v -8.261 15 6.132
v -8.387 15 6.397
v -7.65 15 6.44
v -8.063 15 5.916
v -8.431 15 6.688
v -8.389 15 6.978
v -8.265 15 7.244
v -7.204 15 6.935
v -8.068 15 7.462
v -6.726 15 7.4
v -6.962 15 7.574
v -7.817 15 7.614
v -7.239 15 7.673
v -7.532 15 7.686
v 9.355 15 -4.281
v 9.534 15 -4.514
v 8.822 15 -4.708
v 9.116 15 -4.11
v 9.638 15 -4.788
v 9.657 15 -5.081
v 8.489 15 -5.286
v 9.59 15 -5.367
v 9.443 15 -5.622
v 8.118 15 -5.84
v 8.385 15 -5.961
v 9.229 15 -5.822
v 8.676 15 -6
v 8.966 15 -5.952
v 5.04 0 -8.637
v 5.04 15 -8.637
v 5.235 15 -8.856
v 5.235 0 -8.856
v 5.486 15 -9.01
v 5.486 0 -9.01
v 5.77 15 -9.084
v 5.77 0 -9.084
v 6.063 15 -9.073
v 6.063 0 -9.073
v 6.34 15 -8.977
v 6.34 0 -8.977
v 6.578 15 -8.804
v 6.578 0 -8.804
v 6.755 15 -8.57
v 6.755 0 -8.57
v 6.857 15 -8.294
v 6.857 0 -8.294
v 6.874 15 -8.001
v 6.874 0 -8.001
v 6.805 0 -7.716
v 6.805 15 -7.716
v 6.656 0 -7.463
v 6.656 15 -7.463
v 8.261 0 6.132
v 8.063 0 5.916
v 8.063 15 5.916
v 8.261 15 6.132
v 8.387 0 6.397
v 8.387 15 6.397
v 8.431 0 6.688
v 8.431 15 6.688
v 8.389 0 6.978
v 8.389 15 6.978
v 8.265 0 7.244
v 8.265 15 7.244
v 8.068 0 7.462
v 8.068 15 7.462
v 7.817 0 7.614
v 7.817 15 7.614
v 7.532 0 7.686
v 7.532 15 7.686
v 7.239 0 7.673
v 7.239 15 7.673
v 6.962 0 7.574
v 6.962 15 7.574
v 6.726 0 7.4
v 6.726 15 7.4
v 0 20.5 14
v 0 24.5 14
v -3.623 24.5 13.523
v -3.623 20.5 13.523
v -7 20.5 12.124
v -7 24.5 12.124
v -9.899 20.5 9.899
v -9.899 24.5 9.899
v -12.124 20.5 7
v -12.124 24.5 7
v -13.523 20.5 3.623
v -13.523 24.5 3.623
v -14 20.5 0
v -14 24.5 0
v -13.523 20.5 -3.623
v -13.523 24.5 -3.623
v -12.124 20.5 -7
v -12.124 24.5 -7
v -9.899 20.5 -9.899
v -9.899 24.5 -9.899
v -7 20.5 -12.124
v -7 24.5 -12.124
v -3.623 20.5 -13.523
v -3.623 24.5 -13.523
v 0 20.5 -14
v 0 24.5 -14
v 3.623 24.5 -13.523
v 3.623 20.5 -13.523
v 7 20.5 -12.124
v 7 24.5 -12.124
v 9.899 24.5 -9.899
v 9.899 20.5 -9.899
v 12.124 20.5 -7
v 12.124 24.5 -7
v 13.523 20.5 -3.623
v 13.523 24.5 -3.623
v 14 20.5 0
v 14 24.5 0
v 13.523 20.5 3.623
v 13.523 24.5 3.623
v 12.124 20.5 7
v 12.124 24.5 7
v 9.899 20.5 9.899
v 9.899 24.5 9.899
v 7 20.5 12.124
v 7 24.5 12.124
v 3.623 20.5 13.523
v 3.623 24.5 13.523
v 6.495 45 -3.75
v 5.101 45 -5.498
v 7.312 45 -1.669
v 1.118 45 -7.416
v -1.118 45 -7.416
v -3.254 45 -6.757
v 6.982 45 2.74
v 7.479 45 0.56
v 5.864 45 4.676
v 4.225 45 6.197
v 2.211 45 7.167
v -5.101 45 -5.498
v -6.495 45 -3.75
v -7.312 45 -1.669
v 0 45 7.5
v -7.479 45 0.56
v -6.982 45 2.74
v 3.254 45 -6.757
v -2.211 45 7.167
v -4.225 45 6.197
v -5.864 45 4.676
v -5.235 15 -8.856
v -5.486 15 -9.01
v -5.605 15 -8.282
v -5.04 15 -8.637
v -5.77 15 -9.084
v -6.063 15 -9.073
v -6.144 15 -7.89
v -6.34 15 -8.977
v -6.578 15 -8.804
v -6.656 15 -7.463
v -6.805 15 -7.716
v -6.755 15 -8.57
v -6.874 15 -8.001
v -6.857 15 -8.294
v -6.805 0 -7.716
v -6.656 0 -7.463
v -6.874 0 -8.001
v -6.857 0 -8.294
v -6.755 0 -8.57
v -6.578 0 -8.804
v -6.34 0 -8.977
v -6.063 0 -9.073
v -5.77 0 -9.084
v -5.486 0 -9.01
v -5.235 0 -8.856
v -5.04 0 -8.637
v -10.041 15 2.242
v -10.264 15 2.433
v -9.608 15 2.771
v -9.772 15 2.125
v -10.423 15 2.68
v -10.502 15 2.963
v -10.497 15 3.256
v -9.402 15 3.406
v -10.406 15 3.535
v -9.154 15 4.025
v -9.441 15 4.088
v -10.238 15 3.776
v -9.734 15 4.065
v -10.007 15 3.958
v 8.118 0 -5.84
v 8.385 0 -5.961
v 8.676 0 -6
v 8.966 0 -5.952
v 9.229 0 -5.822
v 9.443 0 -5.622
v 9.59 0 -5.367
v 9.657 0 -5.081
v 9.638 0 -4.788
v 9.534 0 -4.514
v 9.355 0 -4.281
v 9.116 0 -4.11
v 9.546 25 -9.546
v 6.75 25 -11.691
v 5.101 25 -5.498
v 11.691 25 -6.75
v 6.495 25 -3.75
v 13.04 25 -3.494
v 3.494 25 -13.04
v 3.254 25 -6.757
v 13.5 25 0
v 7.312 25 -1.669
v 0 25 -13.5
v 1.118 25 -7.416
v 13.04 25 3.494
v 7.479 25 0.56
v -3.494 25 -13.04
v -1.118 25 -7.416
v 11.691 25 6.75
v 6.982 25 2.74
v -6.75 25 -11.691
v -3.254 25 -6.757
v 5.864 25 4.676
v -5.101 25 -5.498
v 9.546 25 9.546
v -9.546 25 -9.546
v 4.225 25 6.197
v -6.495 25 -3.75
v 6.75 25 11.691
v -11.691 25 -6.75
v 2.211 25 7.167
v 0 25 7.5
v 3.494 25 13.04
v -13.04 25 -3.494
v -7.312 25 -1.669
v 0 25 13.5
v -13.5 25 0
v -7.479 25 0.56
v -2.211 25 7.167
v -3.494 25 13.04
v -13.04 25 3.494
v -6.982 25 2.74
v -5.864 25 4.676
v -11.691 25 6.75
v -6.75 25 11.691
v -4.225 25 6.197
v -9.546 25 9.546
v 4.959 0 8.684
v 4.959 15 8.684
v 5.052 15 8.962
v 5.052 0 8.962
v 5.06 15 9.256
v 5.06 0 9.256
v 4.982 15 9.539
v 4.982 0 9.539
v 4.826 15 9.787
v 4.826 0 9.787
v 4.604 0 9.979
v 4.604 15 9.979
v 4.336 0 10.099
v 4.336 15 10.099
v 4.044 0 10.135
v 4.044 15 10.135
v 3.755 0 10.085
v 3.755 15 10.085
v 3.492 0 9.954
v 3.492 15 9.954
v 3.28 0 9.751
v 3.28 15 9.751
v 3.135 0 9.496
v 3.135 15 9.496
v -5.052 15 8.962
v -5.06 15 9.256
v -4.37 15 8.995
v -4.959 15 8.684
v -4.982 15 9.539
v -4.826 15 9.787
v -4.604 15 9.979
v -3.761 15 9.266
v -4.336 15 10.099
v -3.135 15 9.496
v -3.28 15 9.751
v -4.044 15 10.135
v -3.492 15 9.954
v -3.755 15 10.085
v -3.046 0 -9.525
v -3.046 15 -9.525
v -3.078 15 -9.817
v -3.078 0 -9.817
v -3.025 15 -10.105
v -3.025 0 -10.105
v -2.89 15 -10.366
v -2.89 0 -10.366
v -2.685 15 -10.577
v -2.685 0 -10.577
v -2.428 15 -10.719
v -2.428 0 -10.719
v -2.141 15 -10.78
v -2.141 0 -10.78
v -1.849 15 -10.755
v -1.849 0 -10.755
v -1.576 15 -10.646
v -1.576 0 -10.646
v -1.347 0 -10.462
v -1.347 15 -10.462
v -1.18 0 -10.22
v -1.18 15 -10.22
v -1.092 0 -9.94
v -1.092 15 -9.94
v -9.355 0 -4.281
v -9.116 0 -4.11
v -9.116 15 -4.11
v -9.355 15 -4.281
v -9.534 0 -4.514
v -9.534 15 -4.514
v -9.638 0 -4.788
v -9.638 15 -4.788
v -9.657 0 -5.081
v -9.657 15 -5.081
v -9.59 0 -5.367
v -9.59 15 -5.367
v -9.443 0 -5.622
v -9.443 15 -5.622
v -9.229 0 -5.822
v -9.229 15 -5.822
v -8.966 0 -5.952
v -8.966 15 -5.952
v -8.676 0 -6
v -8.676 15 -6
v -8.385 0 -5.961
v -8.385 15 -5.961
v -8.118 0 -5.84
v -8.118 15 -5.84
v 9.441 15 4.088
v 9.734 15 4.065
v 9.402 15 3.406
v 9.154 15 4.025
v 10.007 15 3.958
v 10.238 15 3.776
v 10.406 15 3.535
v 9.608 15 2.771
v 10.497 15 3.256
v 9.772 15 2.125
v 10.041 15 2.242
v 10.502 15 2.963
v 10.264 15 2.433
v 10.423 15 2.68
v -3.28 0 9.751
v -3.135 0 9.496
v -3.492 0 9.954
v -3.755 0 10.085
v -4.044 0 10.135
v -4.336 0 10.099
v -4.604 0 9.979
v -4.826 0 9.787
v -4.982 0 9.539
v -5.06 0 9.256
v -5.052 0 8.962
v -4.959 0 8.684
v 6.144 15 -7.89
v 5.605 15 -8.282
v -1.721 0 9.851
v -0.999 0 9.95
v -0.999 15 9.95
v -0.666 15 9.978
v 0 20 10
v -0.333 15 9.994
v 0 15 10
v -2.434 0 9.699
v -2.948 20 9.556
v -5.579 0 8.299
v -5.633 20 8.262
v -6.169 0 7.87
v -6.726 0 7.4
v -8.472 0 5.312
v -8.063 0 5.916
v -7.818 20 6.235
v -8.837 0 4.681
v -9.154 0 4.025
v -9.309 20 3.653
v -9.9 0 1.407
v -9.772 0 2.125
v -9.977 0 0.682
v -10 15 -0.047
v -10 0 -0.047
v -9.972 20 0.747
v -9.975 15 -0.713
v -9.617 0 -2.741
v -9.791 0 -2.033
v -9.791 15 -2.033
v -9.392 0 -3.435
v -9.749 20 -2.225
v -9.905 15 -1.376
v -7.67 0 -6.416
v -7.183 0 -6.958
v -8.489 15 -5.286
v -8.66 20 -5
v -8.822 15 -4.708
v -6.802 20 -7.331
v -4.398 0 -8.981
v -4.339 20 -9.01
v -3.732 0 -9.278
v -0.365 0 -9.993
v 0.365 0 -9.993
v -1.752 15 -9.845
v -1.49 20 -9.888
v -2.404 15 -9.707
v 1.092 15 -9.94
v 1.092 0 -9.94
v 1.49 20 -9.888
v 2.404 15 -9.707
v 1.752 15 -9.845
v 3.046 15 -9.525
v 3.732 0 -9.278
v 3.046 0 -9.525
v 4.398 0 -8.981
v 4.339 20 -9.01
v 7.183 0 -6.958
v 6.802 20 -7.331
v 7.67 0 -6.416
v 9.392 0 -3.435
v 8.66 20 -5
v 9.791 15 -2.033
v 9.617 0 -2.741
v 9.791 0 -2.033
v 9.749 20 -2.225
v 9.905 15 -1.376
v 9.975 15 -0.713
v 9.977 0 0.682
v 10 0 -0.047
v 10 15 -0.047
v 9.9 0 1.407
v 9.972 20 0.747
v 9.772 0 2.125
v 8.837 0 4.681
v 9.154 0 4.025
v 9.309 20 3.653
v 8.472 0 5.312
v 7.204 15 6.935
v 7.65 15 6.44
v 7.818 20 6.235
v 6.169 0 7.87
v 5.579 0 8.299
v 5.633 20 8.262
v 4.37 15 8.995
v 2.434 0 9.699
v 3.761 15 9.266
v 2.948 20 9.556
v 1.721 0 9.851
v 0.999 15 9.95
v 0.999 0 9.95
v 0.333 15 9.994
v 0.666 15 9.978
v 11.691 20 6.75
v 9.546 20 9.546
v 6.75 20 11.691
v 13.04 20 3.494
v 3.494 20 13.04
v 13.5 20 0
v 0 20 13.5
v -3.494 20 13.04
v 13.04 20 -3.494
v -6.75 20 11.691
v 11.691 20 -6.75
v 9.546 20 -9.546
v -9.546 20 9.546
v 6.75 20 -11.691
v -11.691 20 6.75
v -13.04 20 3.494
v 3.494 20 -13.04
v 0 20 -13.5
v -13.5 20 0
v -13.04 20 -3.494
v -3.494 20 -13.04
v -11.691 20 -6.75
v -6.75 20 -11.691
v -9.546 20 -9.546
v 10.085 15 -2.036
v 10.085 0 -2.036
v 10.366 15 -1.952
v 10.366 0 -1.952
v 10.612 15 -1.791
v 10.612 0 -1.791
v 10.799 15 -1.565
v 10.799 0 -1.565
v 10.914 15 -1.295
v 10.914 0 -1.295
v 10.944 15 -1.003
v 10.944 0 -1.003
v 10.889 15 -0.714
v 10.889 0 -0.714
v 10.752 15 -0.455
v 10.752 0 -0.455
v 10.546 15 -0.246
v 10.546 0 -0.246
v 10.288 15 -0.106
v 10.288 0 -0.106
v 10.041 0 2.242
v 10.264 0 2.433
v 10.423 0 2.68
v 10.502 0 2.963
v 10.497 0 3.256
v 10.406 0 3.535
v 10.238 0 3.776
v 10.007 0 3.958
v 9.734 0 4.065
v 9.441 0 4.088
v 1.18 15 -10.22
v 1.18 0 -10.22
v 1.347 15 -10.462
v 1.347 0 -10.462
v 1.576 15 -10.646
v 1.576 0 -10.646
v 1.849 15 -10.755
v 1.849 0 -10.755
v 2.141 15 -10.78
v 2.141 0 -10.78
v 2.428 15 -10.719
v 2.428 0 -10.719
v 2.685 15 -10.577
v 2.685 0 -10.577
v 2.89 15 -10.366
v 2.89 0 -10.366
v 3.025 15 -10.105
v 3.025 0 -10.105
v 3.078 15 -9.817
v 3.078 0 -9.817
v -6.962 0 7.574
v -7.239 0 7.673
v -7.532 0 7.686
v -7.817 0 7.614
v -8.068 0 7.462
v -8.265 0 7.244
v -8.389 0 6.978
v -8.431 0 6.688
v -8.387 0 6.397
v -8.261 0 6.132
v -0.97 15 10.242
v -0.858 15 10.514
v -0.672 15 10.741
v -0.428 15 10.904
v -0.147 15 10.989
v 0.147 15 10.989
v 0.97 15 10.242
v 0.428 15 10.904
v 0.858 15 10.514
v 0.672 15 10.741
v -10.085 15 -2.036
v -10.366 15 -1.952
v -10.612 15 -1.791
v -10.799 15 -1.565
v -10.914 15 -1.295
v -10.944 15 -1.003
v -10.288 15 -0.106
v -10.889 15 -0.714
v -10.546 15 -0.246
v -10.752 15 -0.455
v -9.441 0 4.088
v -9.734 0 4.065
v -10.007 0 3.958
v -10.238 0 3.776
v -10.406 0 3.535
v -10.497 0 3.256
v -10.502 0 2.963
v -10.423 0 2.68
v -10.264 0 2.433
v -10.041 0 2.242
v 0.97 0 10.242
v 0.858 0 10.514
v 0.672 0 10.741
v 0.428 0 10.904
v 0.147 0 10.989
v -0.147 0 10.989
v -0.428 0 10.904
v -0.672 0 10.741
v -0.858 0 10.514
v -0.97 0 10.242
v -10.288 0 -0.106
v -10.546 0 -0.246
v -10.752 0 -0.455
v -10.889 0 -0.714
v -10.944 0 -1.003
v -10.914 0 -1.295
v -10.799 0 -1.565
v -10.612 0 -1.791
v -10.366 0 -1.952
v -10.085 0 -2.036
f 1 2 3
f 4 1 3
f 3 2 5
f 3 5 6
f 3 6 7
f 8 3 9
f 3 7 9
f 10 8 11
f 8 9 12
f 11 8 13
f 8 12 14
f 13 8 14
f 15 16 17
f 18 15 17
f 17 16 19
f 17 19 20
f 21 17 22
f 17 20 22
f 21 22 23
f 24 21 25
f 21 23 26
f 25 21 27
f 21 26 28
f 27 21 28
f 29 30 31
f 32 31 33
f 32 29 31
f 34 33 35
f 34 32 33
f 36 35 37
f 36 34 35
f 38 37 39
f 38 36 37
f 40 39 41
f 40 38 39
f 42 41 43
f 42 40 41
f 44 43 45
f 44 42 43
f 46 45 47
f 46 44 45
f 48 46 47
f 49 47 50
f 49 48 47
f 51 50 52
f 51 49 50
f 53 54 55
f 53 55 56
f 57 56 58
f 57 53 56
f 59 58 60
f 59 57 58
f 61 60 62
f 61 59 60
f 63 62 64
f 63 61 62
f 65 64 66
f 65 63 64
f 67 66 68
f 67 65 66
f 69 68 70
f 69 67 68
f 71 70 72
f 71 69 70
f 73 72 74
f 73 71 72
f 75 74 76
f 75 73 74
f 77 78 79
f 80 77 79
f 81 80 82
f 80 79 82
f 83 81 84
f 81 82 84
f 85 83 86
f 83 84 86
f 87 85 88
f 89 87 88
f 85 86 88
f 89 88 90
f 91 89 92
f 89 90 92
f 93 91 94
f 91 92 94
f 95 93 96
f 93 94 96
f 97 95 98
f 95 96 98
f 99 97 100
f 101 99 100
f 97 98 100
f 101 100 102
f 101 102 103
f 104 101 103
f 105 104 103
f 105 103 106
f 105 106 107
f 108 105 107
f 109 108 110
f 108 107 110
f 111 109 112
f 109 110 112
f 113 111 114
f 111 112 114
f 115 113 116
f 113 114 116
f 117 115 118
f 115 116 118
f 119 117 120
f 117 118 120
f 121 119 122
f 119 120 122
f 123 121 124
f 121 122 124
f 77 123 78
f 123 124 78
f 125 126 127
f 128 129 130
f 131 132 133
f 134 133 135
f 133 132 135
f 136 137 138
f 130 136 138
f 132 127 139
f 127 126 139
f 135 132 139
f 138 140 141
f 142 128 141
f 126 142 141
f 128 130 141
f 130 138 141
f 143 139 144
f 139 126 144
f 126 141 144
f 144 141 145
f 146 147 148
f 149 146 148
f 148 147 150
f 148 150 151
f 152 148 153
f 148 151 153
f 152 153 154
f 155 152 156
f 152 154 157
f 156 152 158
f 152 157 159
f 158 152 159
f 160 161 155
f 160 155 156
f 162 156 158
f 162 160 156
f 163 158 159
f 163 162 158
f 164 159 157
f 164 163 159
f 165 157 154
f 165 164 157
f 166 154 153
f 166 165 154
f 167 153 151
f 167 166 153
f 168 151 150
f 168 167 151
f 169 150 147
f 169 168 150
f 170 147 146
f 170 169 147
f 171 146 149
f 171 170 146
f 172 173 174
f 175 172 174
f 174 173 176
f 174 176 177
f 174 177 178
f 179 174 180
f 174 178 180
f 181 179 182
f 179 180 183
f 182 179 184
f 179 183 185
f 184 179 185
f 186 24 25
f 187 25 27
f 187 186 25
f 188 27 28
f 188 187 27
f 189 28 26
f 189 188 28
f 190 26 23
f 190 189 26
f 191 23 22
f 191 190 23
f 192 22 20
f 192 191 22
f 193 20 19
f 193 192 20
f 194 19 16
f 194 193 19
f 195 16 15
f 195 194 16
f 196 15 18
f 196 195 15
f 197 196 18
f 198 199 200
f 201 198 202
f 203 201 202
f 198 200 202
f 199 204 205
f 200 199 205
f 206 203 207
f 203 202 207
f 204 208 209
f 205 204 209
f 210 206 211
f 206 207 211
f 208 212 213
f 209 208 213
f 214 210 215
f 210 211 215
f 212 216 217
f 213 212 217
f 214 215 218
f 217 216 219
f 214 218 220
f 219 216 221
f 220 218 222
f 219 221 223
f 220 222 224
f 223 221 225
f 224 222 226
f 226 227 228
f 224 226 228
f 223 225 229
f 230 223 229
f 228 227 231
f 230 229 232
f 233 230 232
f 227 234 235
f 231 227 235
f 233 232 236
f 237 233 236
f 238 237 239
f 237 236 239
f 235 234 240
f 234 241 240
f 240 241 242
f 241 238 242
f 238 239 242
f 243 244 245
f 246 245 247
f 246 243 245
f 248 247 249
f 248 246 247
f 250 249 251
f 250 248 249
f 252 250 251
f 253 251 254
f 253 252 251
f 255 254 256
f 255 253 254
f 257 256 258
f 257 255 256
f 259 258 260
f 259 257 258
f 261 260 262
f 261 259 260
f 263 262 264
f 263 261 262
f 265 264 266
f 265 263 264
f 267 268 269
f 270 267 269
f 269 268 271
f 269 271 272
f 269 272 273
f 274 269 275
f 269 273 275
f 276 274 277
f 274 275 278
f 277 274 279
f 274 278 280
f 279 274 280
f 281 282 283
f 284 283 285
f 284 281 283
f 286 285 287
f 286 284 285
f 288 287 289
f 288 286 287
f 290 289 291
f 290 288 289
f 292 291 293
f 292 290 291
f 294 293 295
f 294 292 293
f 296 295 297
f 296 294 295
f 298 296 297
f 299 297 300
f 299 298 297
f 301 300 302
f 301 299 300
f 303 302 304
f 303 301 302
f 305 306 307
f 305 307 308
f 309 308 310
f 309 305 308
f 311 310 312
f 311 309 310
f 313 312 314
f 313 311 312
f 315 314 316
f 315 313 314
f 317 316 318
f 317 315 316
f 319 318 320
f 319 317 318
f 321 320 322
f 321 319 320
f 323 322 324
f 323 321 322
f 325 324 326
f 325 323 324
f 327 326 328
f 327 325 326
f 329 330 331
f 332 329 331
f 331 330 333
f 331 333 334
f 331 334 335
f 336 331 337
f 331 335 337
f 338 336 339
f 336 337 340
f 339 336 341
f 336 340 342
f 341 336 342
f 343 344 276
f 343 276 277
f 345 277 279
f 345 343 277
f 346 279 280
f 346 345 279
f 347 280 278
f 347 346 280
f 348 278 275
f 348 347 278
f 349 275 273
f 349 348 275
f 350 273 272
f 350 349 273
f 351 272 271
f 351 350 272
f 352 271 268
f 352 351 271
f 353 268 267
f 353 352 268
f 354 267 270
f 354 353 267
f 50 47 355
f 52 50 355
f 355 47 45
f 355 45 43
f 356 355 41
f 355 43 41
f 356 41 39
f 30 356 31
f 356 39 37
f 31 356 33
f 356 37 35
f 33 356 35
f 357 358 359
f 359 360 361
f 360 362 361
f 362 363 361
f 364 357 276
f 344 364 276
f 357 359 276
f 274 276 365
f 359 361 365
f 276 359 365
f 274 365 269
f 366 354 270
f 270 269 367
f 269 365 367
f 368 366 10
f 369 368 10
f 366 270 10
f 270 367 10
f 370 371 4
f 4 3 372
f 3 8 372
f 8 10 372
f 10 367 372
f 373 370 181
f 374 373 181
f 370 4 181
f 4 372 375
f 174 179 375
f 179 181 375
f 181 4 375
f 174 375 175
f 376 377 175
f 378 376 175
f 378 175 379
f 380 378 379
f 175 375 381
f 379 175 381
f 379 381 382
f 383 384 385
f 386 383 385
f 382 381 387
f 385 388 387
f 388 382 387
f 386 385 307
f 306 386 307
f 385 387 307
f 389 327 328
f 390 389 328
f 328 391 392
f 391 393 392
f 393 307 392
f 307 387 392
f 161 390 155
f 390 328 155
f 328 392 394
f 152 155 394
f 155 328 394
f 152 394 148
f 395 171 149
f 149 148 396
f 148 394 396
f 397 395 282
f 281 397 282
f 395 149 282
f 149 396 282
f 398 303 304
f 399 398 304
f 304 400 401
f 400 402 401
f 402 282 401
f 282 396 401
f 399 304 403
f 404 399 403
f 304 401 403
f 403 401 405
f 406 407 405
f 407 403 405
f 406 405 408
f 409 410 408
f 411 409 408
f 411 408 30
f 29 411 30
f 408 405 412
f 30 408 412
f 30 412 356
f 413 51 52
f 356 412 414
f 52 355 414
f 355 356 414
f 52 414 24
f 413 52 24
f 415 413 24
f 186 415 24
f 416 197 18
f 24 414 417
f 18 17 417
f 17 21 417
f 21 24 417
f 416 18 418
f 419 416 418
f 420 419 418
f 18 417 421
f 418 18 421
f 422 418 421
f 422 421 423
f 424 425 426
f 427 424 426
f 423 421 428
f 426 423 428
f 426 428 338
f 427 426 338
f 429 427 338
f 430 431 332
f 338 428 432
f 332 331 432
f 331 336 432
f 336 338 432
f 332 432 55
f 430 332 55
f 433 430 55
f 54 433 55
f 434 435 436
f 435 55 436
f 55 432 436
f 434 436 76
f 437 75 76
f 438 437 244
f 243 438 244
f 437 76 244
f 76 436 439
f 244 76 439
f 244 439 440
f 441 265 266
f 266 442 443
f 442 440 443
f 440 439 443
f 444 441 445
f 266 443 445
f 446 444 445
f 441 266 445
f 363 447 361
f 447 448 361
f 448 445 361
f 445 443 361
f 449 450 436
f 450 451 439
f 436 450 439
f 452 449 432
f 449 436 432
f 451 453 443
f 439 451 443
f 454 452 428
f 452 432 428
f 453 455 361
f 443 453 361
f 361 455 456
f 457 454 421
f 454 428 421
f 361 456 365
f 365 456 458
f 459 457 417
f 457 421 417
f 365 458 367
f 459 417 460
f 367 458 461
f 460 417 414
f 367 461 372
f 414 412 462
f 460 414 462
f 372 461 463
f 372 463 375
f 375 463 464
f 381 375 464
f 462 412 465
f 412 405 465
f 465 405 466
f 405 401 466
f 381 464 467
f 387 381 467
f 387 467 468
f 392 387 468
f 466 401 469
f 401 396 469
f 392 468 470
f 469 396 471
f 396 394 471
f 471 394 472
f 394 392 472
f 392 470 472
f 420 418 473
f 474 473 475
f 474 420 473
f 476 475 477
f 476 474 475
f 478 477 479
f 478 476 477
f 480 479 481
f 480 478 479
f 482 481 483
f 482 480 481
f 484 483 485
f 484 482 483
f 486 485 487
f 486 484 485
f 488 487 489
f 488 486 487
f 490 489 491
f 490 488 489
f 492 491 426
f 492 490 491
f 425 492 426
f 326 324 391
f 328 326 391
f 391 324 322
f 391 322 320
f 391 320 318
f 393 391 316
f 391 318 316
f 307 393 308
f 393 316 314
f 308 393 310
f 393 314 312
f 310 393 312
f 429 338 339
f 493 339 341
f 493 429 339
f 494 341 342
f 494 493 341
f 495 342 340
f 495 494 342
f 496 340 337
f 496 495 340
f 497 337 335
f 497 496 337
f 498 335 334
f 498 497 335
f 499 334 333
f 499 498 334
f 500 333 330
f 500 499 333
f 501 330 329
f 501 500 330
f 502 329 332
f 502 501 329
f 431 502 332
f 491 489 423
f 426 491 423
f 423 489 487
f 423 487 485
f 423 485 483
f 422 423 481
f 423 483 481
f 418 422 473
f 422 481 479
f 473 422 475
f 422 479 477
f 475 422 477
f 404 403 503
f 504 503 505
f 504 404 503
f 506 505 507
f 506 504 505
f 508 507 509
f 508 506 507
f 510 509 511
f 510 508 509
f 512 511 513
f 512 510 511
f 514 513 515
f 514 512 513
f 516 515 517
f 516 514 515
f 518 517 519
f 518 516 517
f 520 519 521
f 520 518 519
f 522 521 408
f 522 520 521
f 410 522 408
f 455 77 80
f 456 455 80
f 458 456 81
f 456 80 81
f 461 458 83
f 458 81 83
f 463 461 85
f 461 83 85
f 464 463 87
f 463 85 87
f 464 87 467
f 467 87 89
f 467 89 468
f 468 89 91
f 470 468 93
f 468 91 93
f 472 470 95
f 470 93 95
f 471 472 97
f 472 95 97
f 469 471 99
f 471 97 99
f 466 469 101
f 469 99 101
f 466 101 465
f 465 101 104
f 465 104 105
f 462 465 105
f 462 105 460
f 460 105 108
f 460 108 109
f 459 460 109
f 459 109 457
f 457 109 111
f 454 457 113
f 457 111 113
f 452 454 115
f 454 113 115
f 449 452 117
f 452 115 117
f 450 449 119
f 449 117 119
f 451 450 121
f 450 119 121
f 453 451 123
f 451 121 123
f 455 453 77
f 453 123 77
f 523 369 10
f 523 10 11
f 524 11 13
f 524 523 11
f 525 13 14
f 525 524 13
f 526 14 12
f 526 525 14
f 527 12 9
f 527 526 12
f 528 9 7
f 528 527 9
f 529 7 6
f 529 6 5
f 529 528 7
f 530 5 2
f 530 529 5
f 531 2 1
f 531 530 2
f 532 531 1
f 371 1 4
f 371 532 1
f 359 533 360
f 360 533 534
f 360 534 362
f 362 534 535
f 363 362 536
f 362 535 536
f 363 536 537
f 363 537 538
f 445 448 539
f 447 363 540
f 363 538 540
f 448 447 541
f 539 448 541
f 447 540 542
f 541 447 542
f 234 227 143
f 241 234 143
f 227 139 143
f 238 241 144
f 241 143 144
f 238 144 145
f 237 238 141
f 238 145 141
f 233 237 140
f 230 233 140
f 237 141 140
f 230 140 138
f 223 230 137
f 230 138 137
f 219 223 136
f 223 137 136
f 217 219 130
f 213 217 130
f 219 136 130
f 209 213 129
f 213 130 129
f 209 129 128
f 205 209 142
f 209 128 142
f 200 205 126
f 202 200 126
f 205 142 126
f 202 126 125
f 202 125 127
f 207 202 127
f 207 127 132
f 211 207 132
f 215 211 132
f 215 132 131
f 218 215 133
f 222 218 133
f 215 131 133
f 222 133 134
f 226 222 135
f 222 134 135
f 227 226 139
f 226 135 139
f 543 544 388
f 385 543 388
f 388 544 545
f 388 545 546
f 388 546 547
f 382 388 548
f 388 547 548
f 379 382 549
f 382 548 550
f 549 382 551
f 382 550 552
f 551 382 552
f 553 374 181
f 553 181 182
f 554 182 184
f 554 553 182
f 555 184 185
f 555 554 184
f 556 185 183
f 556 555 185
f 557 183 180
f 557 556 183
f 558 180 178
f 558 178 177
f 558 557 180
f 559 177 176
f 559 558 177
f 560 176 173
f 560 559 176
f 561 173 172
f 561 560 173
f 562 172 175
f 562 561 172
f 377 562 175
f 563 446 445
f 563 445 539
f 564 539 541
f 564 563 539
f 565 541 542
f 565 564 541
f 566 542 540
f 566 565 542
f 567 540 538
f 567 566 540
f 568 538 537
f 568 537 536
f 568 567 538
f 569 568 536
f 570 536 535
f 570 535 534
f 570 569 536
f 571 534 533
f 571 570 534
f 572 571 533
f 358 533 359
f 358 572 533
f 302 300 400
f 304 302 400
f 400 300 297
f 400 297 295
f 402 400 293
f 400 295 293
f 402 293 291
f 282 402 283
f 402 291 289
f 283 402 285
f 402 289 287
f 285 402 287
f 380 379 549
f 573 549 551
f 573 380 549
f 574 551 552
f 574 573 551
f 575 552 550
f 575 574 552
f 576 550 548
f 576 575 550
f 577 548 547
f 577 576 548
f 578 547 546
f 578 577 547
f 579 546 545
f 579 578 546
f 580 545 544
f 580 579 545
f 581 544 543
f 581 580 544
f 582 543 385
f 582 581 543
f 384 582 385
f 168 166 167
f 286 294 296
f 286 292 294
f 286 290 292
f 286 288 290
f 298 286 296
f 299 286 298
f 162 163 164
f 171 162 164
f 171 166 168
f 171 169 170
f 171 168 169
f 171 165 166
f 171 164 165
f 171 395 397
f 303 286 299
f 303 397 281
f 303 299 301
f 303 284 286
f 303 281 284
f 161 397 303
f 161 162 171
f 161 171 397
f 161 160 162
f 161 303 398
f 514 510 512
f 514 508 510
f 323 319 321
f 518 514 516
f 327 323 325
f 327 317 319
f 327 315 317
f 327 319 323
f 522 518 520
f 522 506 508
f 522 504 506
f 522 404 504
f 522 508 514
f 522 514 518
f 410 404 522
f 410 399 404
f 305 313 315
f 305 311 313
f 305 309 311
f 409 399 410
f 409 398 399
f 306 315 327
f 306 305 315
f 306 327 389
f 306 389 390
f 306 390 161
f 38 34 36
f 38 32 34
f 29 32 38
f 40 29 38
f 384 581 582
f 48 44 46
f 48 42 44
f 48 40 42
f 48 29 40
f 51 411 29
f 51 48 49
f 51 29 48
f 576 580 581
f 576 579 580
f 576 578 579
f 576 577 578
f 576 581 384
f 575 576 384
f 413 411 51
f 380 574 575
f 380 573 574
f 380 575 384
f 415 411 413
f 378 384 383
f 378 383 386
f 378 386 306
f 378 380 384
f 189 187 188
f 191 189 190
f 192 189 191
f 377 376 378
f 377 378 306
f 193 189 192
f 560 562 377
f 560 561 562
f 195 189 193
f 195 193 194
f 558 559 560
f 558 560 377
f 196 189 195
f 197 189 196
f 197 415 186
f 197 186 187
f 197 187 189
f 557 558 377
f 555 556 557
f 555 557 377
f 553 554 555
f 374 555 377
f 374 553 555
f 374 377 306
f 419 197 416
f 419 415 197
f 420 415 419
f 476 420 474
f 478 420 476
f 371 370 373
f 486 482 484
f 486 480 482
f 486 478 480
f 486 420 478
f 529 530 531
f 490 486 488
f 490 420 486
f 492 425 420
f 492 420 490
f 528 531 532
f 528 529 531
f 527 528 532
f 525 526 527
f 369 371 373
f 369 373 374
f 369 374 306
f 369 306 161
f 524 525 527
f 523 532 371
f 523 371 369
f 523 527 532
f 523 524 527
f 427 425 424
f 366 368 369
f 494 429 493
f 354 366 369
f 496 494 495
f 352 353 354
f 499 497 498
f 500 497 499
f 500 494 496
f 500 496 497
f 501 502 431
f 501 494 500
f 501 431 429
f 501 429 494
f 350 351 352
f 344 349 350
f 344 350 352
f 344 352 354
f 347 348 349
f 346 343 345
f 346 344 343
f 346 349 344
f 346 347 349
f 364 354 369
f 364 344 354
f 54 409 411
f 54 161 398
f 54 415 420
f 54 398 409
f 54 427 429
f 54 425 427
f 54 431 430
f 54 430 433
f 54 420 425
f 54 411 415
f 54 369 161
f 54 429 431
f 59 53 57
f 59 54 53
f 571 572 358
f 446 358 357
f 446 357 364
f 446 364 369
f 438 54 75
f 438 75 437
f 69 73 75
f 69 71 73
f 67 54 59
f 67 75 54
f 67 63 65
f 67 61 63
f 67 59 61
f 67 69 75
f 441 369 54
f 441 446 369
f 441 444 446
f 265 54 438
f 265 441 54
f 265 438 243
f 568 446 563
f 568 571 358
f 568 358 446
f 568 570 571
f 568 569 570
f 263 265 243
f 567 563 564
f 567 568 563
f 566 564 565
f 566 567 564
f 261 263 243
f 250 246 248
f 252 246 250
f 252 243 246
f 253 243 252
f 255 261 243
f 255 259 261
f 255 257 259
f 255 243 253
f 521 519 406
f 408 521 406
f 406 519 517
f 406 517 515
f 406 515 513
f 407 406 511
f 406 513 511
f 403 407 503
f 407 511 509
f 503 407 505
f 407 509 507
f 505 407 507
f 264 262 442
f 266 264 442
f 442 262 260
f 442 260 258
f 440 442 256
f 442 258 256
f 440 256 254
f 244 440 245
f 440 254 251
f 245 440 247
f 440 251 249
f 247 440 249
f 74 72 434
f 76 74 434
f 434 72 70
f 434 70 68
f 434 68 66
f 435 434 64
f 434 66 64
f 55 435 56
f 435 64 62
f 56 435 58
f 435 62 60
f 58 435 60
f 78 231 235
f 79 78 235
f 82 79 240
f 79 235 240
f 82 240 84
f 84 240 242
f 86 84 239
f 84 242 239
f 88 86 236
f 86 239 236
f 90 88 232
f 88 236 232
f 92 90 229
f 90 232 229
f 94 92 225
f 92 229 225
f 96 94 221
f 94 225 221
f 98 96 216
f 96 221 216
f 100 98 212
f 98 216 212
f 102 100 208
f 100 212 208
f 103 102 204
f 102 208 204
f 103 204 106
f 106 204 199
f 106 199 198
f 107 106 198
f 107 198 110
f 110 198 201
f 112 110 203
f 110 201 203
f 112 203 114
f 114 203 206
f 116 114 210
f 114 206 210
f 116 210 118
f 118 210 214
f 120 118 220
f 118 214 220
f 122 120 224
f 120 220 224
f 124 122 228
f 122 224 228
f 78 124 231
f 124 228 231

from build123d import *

# Parameters (mm, degrees)
SKETCH3_R           = 1
BOSS_EXTRUDE1_DEPTH = 15
CIRPATTERN1_COUNT   = 15
CHAMFER1_SIZE       = 0.5


with BuildPart() as part:
    # Sketch2 → Revolve1 (revolve)
    with BuildSketch(Plane(origin=(0, 0, 0), x_dir=(0, 0, -1), z_dir=(1, 0, 0)), mode=Mode.PRIVATE) as revolve1_sk:
        Polygon((0, 0), (10, 0), (10, 20), (14, 20), (14, 25), (7.5, 25), (7.5, 45), (0, 45), align=None)
    revolve(revolve1_sk.sketch.rotate(Axis((0, 45, 0), (0, -1, 0)), 180), axis=Axis((0, 45, 0), (0, -1, 0)))

    # Sketch3 → Boss-Extrude1 (add)
    with BuildSketch(Plane.XZ):
        with Locations((0, 10)):
            Circle(SKETCH3_R)
    boss_extrude1 = extrude(amount=-BOSS_EXTRUDE1_DEPTH)

    # CirPattern1: Boss-Extrude1 ×15 about axis
    cirpattern1_axis = Axis((0, 0, 0), (0, 1, 0))
    for i in range(1, CIRPATTERN1_COUNT):
        add(boss_extrude1.rotate(cirpattern1_axis, i * 360 / CIRPATTERN1_COUNT))

    # Chamfer1
    chamfer1_edges = [part.edges().sort_by_distance(p)[0] for p in [
        (0, 25, -14),
        (0, 20, -14),
    ]]
    chamfer(chamfer1_edges, length=CHAMFER1_SIZE)


solid = part.part
